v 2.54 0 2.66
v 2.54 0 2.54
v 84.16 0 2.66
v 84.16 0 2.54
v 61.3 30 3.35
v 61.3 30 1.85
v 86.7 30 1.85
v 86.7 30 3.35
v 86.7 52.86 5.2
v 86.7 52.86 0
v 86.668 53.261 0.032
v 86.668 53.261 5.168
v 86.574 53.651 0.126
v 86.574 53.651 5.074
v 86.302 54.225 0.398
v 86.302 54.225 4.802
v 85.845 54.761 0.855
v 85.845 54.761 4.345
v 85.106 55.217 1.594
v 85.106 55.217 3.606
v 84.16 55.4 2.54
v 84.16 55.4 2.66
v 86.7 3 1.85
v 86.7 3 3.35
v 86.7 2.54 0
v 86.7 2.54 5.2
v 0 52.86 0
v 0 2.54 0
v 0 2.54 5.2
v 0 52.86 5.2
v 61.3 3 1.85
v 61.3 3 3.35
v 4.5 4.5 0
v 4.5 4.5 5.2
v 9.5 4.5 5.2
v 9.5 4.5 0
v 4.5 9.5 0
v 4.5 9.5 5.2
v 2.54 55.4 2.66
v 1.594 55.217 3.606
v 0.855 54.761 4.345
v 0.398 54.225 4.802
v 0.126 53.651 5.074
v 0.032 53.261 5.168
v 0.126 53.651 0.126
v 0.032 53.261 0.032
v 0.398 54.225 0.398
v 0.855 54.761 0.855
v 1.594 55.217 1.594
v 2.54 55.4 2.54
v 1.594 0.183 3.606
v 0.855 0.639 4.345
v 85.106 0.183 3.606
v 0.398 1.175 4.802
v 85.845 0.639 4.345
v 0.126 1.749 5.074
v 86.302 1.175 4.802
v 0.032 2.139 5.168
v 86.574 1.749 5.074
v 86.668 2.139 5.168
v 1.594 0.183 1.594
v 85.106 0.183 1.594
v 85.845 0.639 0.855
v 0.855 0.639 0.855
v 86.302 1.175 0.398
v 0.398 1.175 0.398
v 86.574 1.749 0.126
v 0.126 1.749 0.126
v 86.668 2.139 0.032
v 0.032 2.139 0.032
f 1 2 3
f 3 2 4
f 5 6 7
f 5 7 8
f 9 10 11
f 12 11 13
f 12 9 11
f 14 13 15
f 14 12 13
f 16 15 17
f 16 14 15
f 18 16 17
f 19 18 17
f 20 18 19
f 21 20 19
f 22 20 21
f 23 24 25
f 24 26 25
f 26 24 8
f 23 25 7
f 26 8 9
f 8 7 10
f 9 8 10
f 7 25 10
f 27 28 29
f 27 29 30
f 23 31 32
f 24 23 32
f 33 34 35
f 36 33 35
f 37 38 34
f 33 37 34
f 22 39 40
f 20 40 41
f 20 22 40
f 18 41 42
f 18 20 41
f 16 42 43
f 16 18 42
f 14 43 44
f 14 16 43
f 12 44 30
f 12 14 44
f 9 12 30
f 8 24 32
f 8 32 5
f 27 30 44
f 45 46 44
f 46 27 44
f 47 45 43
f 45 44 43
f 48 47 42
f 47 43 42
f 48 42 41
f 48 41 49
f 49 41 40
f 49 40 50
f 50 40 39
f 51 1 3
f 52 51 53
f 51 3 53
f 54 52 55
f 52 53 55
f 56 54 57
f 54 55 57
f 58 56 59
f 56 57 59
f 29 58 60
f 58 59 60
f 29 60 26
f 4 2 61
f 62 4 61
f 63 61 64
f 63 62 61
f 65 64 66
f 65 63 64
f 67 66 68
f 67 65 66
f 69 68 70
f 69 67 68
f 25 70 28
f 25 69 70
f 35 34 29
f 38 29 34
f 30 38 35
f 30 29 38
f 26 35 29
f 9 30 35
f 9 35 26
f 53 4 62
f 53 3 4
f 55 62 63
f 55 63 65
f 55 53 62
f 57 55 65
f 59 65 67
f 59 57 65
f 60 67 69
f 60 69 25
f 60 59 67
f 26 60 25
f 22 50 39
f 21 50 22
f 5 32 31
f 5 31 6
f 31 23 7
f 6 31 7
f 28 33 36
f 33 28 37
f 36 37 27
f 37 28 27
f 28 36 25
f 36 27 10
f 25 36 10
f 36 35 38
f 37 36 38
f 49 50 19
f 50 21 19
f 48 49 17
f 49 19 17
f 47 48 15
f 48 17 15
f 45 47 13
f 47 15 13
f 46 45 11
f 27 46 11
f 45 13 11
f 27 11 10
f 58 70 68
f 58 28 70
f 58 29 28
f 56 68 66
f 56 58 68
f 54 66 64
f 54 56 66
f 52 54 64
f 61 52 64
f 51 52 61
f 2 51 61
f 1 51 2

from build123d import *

# Parameters (mm, degrees)
F0_W     = 86.7
F0_H     = 55.4
F1_DEPTH = 5.2
F2_R     = 2.54
F4_DEPTH = 25.4
F6_W     = 27
F6_H     = 1.5
F7_DEPTH = 25.4


with BuildPart() as f1:
    # F0 (on Top) → F1 (new body)
    with BuildSketch(Plane.XY):
        with Locations((43.35, 27.7)):
            Rectangle(F0_W, F0_H)
    extrude(amount=F1_DEPTH)

    # F2
    f2_edges = [f1.edges().sort_by_distance(p)[0] for p in [
        (43.35, 0, 5.2),
        (43.35, 0, 0),
        (43.35, 55.4, 5.2),
        (43.35, 55.4, 0),
        (86.7, 0, 2.6),
        (0, 0, 2.6),
        (0, 55.4, 2.6),
        (86.7, 55.4, 2.6),
    ]]
    fillet(f2_edges, radius=F2_R)

    # F3 (on face) → F4 (cut)
    with BuildSketch(Plane.XY.offset(5.2)):
        Polygon((9.5, 4.5), (4.5, 9.5), (4.5, 4.5), align=None)
    extrude(amount=-F4_DEPTH, mode=Mode.SUBTRACT)

    # F6 (on face) → F7 (cut)
    with BuildSketch(Plane.YZ.offset(86.7)):
        with Locations((16.5, 2.6)):
            Rectangle(F6_W, F6_H)
    extrude(amount=-F7_DEPTH, mode=Mode.SUBTRACT)


solid = f1.part
